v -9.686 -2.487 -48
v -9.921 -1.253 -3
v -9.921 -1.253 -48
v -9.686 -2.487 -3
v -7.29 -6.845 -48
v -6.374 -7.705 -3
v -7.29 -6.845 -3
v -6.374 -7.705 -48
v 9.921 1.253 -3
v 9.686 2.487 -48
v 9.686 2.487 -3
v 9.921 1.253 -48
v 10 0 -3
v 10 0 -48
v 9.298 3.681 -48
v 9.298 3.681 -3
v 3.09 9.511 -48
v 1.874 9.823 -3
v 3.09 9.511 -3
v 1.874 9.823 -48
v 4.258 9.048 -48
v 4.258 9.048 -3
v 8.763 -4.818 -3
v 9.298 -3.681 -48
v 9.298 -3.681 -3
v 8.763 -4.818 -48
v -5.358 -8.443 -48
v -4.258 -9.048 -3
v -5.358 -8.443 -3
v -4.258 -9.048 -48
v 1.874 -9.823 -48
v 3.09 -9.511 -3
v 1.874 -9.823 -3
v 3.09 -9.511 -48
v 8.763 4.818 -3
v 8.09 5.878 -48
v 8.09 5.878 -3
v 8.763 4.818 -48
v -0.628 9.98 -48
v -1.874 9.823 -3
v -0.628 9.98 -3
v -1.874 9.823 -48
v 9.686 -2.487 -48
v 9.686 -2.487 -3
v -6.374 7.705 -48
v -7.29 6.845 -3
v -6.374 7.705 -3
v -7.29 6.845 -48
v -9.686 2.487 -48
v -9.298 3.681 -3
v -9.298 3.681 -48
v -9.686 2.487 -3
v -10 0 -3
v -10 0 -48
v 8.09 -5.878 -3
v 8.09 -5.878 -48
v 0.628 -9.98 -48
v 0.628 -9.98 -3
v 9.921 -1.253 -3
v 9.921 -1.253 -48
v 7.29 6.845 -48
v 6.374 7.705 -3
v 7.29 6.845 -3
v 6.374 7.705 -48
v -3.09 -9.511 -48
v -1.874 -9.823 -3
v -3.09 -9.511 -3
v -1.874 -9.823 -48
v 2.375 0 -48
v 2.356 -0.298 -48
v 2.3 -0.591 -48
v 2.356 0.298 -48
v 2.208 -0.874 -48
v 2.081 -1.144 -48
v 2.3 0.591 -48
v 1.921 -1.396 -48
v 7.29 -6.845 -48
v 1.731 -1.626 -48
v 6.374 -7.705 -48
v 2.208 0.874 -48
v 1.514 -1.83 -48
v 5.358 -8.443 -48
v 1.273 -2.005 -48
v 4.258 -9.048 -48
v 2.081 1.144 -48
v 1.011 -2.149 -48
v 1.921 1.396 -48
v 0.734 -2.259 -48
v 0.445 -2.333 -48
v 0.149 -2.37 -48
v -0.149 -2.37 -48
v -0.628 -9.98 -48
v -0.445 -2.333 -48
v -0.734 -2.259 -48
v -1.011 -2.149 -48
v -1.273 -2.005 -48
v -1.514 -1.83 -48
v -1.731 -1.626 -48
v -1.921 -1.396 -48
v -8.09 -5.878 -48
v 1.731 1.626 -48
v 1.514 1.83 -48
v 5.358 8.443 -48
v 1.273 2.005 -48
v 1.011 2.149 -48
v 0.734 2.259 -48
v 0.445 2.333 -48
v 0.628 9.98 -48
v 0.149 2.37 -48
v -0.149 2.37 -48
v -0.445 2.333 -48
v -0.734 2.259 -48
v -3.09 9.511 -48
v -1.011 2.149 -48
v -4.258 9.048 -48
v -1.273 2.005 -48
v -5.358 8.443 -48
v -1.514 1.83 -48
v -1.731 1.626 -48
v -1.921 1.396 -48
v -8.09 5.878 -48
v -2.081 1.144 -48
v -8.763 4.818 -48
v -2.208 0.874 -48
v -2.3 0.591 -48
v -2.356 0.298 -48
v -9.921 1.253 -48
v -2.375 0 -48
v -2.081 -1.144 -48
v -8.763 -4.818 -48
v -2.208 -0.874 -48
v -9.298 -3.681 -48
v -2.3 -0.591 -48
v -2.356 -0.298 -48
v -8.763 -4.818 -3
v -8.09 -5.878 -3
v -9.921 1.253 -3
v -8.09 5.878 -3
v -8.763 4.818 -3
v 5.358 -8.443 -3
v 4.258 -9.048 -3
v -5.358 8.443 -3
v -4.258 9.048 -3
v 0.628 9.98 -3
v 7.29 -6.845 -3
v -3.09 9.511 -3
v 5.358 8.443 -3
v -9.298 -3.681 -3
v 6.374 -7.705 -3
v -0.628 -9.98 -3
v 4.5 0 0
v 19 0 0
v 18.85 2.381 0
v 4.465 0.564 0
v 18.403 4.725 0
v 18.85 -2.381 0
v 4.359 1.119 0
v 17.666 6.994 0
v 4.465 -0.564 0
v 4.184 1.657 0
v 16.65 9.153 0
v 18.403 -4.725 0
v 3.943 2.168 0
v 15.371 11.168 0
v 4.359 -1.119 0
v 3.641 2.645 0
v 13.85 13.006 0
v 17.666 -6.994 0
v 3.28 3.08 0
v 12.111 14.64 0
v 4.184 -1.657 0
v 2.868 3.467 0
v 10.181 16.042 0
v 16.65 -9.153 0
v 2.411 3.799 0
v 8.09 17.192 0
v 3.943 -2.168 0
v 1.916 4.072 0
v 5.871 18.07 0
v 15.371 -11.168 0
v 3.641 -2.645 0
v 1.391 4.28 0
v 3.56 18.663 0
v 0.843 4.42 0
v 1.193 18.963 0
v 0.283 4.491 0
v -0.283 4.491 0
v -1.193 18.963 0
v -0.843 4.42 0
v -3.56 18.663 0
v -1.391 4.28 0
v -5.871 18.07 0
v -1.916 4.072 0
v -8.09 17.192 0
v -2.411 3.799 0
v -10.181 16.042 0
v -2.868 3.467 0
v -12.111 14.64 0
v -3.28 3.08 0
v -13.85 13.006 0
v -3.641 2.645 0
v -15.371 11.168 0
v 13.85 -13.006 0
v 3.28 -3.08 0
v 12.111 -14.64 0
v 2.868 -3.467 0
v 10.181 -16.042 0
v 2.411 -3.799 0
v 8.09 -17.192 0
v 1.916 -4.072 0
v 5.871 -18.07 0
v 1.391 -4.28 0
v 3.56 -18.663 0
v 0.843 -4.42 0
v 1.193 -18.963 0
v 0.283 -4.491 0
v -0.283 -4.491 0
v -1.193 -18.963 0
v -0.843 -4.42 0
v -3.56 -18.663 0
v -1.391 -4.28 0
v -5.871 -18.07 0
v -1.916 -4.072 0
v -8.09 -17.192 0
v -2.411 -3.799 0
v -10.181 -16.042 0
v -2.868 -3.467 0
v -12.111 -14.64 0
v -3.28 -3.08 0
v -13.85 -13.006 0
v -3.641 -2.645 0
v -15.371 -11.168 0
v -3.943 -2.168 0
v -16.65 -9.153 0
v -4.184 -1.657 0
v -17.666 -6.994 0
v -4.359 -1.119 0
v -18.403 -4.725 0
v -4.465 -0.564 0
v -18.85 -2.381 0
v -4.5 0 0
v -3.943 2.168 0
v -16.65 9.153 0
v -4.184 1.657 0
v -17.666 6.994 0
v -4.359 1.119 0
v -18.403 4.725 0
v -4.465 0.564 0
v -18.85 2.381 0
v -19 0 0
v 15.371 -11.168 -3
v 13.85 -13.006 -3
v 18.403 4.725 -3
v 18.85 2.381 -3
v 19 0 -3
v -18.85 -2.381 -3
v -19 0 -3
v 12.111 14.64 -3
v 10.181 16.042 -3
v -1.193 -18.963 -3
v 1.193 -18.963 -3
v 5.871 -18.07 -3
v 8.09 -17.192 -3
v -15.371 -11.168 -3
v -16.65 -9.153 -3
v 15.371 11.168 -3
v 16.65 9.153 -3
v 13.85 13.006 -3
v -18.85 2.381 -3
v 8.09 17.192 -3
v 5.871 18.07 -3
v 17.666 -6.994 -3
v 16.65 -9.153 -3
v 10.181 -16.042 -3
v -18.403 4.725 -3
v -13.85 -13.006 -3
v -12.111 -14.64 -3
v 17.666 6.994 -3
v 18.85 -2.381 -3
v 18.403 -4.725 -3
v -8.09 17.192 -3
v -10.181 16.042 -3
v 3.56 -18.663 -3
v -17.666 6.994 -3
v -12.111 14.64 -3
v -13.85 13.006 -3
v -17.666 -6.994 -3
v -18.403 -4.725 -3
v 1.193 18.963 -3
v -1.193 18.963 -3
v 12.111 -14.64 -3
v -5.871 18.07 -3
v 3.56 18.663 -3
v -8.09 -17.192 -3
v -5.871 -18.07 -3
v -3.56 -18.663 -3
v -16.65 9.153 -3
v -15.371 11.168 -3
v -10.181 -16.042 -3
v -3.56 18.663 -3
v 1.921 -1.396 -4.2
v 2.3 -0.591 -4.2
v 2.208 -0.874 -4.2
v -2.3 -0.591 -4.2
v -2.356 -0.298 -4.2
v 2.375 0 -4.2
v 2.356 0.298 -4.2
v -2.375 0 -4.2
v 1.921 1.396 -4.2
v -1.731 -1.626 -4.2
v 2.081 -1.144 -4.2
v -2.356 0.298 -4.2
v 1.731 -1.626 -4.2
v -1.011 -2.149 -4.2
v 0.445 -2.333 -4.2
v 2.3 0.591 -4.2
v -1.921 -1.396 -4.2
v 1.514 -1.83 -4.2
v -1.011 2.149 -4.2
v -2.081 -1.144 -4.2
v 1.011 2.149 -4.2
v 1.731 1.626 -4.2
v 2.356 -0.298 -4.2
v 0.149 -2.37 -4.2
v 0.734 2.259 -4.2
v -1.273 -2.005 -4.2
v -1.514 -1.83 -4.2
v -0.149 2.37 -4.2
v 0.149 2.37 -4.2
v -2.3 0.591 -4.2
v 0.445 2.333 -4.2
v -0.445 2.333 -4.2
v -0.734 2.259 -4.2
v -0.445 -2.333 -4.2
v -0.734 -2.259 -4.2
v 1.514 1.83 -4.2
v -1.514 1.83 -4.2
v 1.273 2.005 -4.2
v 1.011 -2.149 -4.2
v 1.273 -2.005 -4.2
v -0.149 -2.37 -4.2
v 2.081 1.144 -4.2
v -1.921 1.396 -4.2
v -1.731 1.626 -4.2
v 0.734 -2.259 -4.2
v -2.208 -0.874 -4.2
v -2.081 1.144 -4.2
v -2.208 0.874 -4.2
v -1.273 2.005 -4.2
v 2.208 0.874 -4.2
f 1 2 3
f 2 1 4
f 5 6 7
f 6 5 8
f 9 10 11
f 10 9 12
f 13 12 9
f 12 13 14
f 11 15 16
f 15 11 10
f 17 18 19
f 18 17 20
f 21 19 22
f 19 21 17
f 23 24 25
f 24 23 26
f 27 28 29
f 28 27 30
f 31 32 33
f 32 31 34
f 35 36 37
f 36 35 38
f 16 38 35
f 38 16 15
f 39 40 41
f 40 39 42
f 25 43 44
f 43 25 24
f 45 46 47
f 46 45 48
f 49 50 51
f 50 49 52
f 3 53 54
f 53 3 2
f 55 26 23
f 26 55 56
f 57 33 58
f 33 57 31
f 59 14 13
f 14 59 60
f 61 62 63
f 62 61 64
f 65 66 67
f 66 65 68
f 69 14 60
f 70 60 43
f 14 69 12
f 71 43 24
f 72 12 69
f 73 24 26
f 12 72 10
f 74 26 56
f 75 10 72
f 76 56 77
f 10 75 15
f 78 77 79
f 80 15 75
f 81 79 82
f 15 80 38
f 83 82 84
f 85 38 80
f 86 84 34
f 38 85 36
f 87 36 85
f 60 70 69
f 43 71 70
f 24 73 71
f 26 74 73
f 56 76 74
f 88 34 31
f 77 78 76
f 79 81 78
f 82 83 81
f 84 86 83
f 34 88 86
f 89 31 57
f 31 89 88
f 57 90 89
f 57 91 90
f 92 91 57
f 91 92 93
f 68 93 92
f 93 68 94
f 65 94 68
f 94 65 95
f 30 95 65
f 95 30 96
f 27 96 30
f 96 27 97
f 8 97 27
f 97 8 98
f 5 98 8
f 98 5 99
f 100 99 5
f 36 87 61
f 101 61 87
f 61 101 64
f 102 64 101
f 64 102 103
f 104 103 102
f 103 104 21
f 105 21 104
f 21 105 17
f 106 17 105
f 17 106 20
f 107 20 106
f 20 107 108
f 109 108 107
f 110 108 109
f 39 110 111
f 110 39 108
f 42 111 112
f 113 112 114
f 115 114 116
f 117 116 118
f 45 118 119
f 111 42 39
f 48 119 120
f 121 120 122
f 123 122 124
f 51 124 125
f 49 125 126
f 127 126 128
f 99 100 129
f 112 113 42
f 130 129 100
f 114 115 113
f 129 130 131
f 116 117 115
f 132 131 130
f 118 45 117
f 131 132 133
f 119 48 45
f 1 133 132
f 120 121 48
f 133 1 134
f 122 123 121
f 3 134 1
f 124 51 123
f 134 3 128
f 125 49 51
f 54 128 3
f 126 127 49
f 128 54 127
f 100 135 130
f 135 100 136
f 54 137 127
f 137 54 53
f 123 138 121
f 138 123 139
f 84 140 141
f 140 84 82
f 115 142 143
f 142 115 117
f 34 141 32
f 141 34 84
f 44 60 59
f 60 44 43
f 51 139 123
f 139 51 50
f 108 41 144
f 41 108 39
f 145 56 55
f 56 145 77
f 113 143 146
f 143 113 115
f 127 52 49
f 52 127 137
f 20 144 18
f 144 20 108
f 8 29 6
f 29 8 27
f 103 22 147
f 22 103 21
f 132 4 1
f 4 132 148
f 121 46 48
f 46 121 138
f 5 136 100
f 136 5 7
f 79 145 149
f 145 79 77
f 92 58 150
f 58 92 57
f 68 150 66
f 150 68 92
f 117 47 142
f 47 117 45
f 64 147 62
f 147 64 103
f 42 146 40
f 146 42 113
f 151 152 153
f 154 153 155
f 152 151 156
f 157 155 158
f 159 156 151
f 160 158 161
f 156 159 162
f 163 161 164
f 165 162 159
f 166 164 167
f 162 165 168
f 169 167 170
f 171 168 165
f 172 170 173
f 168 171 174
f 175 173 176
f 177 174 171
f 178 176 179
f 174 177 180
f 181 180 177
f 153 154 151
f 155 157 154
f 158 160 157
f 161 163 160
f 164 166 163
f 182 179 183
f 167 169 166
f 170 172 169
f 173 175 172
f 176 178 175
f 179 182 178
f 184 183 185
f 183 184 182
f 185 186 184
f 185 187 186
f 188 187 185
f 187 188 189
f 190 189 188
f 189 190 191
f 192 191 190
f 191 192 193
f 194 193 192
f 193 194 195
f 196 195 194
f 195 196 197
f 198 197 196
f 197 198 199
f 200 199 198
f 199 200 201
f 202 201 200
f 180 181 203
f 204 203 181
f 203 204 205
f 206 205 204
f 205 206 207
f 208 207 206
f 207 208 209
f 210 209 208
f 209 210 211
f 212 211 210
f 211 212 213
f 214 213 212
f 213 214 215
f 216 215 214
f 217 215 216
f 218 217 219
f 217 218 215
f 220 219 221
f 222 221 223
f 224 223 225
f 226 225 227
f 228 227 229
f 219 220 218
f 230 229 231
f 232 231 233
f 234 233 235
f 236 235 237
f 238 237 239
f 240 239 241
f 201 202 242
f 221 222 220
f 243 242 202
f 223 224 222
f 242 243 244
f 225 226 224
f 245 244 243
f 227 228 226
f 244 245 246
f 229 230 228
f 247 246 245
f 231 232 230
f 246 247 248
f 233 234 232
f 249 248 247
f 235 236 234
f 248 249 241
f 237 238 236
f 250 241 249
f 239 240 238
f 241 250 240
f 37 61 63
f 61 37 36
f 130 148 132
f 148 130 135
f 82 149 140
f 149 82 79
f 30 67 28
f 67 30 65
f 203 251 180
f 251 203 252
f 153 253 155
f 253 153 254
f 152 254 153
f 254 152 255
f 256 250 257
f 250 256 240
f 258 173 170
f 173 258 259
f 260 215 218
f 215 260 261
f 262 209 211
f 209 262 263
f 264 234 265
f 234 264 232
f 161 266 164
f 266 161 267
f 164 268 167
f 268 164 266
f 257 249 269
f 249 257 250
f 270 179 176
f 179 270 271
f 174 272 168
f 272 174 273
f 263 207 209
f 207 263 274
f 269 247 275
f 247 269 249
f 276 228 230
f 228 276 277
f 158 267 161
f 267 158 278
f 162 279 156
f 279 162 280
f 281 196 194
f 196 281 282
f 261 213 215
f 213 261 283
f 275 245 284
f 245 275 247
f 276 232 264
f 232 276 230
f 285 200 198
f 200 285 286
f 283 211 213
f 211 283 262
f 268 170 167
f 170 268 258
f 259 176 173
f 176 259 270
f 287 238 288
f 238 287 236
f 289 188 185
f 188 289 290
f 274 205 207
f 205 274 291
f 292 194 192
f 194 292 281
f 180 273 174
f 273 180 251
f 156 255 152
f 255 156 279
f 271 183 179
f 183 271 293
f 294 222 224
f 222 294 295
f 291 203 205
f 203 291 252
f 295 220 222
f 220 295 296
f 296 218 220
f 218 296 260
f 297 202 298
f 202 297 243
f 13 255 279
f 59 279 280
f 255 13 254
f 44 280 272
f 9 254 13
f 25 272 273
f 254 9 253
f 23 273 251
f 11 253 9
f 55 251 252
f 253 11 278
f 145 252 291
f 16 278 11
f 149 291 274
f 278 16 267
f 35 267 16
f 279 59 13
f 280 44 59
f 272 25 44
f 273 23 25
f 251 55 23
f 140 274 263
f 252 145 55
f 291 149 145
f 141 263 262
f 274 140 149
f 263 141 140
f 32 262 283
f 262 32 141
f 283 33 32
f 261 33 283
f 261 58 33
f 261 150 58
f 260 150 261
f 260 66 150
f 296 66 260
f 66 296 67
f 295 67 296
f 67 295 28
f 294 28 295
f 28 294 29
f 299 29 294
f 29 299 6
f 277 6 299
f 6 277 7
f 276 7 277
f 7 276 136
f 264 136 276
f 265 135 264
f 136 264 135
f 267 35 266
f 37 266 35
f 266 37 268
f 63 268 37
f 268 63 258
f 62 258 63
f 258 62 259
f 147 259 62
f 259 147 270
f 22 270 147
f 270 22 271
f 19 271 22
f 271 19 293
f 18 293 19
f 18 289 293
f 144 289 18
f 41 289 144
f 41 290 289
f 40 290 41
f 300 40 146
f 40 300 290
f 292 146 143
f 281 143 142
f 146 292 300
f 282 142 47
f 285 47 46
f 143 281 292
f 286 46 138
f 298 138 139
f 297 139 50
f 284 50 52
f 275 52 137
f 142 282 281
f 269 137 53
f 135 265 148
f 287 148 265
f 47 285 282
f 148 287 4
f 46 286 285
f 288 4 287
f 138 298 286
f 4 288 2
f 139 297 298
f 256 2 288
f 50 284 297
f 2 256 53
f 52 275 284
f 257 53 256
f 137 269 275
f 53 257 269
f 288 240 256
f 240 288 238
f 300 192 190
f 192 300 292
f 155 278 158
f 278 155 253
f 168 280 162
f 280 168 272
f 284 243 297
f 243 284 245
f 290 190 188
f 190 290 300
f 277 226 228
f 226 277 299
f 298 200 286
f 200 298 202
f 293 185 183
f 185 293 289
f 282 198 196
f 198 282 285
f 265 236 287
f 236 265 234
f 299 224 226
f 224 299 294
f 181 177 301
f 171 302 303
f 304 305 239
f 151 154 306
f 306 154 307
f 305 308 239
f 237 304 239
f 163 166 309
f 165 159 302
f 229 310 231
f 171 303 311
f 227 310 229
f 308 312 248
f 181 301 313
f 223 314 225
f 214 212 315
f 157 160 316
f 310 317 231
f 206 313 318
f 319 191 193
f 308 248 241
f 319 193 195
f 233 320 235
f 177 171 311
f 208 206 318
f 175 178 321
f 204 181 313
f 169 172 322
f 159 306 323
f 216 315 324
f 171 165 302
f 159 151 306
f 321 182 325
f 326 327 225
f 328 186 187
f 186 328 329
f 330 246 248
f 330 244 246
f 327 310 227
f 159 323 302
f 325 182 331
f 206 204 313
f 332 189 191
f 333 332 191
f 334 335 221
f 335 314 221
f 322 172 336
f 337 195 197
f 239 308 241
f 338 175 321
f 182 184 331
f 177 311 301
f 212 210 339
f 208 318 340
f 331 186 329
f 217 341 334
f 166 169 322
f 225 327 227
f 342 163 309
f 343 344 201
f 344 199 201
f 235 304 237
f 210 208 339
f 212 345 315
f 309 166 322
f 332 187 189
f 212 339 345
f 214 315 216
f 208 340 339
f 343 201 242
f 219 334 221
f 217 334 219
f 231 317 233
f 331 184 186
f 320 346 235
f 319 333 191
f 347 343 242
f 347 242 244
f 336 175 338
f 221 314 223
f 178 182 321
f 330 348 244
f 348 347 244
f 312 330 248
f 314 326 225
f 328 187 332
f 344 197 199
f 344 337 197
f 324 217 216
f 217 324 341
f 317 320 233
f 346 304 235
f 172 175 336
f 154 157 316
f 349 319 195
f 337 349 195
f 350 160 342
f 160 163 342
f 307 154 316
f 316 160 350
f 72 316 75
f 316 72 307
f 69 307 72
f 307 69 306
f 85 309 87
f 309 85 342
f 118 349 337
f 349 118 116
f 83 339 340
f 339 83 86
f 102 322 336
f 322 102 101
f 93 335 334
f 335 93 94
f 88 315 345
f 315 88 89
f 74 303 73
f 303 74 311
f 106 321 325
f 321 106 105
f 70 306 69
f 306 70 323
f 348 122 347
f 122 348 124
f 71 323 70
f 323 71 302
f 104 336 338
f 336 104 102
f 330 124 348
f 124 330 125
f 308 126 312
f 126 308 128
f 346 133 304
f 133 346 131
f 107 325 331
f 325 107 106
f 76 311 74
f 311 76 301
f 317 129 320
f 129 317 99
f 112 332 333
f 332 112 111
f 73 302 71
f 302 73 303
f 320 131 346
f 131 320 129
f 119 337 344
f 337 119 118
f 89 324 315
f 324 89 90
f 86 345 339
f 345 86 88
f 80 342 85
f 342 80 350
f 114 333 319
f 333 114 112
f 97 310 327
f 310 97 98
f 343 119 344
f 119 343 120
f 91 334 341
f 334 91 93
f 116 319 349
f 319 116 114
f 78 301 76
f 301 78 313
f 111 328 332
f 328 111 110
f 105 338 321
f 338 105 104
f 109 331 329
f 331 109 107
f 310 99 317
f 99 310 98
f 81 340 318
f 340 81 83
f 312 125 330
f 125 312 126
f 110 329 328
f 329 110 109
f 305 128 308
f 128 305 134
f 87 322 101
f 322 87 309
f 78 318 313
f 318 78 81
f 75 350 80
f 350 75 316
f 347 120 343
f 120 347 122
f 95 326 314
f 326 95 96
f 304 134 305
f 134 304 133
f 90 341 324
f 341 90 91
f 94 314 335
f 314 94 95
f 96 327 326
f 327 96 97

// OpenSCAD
$fn = 50;


difference() {
	union() {
		translate(v = [0, 0, -48.0000000000]) {
			cylinder(h = 48, r = 10.0000000000);
		}
		translate(v = [0, 0, -3.0000000000]) {
			cylinder(h = 3, r = 19.0000000000);
		}
	}
	union() {
		translate(v = [0, 0, 0]) {
			rotate(a = [0, 0, 0]) {
				difference() {
					union() {
						#translate(v = [0, 0, -48.0000000000]) {
							cylinder(h = 48, r = 2.2500000000);
						}
						#translate(v = [0, 0, -4.2000000000]) {
							cylinder(h = 4.2000000000, r1 = 2.3750000000, r2 = 4.5000000000);
						}
						#translate(v = [0, 0, -48.0000000000]) {
							cylinder(h = 48, r = 2.3750000000);
						}
						#translate(v = [0, 0, -48.0000000000]) {
							cylinder(h = 48, r = 2.2500000000);
						}
					}
					union();
				}
			}
		}
	}
}
